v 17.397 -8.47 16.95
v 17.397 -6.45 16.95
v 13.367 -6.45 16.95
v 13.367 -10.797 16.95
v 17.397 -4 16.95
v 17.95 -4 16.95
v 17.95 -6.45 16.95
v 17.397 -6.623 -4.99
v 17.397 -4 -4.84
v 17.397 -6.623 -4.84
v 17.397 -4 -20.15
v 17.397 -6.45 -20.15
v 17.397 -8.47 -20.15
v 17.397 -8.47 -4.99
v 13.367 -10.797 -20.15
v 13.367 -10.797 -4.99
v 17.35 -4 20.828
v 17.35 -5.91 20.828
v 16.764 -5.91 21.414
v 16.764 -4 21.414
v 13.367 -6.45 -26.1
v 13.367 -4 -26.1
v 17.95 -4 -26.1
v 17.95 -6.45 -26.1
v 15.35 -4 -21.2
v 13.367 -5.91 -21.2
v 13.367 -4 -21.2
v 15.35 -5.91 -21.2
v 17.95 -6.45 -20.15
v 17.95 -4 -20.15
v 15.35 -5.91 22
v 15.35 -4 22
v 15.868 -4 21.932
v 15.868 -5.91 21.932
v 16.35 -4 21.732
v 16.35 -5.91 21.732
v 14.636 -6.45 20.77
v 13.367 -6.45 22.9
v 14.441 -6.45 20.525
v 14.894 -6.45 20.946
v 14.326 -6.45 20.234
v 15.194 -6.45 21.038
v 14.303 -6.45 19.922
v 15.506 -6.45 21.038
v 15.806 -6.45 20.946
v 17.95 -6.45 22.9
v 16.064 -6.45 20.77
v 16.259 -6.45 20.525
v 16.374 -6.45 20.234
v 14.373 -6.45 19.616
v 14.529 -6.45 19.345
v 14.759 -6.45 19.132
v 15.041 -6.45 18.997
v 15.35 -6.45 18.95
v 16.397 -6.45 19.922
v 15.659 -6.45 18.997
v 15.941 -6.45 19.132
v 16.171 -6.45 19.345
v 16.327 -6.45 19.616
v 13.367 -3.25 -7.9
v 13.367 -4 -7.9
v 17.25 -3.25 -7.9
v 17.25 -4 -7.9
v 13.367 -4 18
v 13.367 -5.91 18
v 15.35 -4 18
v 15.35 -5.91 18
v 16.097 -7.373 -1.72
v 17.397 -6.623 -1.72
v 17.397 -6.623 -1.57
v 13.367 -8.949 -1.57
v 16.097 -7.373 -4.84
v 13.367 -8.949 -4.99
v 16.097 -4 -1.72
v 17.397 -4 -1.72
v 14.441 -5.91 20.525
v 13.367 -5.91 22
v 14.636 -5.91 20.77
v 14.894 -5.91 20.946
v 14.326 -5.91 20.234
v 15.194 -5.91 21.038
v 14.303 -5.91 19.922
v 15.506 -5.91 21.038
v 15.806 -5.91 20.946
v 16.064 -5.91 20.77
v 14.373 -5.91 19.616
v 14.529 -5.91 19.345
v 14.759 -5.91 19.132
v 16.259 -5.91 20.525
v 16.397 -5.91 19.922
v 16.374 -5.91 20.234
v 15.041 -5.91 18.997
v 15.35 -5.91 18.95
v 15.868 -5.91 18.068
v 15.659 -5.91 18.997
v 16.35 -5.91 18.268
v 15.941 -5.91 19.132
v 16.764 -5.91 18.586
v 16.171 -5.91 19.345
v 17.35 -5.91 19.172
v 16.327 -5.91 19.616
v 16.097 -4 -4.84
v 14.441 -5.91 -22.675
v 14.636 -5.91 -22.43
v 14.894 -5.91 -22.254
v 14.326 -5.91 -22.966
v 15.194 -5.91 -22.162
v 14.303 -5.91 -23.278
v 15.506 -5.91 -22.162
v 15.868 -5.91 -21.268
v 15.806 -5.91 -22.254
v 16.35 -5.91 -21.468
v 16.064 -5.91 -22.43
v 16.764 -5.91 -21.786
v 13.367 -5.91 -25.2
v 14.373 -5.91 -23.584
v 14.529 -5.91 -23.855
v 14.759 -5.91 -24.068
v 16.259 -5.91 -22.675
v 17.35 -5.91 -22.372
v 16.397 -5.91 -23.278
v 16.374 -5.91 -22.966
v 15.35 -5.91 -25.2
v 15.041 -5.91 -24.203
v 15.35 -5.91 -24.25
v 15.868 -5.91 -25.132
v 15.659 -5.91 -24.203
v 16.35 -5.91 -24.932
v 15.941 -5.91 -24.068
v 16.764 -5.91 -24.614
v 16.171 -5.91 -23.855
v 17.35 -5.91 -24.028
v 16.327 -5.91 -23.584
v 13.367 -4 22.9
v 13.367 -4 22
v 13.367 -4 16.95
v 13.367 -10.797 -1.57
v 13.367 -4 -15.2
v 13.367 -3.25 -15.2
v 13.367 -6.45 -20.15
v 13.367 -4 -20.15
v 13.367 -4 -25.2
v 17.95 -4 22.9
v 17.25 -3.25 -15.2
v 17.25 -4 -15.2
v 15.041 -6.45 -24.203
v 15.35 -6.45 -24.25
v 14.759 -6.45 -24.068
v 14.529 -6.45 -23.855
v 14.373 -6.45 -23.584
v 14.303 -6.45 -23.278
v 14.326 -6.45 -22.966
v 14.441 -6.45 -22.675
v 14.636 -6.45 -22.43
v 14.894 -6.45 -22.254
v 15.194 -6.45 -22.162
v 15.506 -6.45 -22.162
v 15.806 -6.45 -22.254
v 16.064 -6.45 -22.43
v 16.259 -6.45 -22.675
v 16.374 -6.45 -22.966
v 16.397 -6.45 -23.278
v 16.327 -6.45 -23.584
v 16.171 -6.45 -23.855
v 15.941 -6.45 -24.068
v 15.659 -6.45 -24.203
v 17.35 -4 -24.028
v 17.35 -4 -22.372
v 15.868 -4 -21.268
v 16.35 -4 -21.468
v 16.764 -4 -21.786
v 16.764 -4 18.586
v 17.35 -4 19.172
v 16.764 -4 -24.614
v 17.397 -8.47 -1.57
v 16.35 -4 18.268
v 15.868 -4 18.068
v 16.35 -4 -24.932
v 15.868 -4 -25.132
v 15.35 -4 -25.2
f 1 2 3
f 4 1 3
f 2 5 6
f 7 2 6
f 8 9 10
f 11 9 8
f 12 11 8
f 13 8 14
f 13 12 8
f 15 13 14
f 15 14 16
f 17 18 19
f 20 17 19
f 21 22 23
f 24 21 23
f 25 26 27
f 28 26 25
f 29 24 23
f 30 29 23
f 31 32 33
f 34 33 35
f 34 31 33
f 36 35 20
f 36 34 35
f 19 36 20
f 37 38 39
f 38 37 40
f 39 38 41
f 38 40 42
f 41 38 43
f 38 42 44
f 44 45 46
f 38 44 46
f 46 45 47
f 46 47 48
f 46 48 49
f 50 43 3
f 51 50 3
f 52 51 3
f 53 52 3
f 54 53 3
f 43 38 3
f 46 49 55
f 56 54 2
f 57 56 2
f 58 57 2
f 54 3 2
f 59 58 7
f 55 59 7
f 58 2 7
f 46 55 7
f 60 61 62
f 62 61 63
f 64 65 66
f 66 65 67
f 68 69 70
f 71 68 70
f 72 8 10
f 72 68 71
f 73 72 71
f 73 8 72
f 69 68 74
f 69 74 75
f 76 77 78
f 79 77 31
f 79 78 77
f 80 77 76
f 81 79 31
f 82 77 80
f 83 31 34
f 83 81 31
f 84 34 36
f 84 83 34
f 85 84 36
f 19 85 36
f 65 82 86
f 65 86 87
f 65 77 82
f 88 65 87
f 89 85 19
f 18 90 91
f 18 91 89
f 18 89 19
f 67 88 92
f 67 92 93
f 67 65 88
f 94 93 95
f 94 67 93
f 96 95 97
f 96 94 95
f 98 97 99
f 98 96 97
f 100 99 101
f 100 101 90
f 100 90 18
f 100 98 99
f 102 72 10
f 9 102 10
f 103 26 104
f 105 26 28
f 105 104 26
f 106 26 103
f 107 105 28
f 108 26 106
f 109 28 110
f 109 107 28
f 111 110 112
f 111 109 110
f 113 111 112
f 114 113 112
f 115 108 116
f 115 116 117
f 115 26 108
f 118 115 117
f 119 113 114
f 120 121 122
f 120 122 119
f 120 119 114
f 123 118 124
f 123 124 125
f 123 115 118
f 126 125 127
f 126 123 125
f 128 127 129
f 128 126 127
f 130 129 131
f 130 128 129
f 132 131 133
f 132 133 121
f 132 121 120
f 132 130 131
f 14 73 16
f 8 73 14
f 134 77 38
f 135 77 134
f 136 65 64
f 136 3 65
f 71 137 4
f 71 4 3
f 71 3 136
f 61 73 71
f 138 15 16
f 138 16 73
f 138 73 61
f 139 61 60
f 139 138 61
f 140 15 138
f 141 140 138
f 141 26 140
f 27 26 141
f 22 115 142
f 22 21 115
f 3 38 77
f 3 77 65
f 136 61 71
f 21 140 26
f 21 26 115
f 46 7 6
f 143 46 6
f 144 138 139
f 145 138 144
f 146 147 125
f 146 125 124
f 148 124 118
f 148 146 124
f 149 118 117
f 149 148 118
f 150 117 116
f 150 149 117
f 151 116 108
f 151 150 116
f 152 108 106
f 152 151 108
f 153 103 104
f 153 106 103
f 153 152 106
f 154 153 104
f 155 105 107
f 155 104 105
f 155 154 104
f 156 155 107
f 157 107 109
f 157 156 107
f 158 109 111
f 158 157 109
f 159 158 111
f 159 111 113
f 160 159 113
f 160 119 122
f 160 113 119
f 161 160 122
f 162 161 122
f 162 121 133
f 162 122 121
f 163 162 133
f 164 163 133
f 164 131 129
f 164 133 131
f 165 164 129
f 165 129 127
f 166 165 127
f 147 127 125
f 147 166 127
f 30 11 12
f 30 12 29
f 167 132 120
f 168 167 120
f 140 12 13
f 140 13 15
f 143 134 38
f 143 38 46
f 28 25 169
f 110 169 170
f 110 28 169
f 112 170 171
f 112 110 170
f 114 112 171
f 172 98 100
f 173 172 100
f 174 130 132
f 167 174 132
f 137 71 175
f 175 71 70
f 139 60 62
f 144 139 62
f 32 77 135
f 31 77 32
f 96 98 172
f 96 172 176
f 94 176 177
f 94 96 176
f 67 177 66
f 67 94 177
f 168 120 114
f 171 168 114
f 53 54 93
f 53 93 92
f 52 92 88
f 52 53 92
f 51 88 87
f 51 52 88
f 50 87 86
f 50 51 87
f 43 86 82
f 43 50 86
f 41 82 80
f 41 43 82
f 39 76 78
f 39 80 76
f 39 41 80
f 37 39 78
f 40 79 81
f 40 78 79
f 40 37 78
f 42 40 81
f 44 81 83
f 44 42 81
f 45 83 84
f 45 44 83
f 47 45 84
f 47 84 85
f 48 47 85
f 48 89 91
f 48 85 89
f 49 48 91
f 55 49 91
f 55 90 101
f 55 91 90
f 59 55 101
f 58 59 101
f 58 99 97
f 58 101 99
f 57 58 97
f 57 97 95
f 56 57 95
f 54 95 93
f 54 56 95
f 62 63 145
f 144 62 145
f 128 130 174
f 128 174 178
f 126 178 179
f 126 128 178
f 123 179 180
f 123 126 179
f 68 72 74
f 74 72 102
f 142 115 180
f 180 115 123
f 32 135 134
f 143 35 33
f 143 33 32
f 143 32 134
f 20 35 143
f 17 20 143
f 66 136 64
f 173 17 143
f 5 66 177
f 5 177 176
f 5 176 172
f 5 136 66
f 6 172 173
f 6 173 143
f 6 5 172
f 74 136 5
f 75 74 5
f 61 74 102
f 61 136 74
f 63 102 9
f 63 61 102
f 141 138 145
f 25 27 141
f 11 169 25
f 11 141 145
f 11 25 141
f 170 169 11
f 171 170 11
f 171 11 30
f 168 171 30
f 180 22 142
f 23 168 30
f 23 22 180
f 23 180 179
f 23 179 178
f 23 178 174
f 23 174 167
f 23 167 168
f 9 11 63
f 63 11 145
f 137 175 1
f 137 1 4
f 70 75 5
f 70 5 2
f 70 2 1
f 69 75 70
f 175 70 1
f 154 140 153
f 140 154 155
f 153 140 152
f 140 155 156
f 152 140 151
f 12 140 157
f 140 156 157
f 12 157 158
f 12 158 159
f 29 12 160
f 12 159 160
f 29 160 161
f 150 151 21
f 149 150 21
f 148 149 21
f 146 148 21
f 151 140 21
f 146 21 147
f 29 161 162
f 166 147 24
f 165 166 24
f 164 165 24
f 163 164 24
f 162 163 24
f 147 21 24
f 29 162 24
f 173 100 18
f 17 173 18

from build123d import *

# Parameters (mm, degrees)
CLAMP_START                     = -20.15
CLAMP_X_BASE_DEPTH              = 37.1
WIRE_START                      = -4.99
WIRE_CHANNEL_X_BASE_Z_5_0_DEPTH = 3.42
WIRE_START_2                    = -4.84
SKETCH3_W                       = 1.6
SKETCH3_H                       = 4.320657937
WIRE_NOTCH_X_BASE_Z_5_0_DEPTH   = 3.12
EAR_START                       = -26.1
SKETCH4_W                       = 4.582851153
SKETCH4_H                       = 2.45
EAR_X_BASE_26_DEPTH             = 5.95
EAR_START_2                     = 16.95
SKETCH5_W                       = 4.582851153
SKETCH5_H                       = 2.45
EAR_X_BASE_17_DEPTH             = 5.95
CUT_EXTRUDE3_START              = -6.55
SKETCH6_R                       = 1.05
CUT_EXTRUDE3_DEPTH              = 2.65
CUT_EXTRUDE4_START              = -5.91
SKETCH7_R                       = 2
CUT_EXTRUDE4_DEPTH              = 1.92
CUT_EXTRUDE5_START              = -5.91
SKETCH8_W                       = 2.082851153
SKETCH8_H                       = 4
CUT_EXTRUDE5_DEPTH              = 1.92
CUT_EXTRUDE6_START              = -5.91
CUT_EXTRUDE6_DEPTH              = 1.92
CUT_EXTRUDE7_START              = -5.91
CUT_EXTRUDE7_DEPTH              = 1.92
BOSS_EXTRUDE4_START             = -4
SKETCH11_W                      = 3.882851153
SKETCH11_H                      = 7.3
BOSS_EXTRUDE4_DEPTH             = 0.75


with BuildPart() as part:
    # Sketch1 → Clamp +X base (new body)
    with BuildSketch(Plane.XY.offset(CLAMP_START)):
        Polygon((13.367148847, -4), (17.397275866, -4), (17.397275866, -8.470102587), (13.367148847, -10.796897507), align=None)
    extrude(amount=CLAMP_X_BASE_DEPTH)

    # Sketch2 → Wire channel +X base Z -5.0 (cut)
    with BuildSketch(Plane.XY.offset(WIRE_START)):
        Polygon((11.102085338, -12.220102587), (19.762339376, -7.220102587), (18.912339376, -5.747859401), (10.252085338, -10.747859401), align=None)
    extrude(amount=WIRE_CHANNEL_X_BASE_Z_5_0_DEPTH, mode=Mode.SUBTRACT)

    # Sketch3 → Wire notch +X base Z -5.0 (cut)
    with BuildSketch(Plane.XY.offset(WIRE_START_2)):
        with Locations((16.897275866, -6.060328969)):
            Rectangle(SKETCH3_W, SKETCH3_H)
    extrude(amount=WIRE_NOTCH_X_BASE_Z_5_0_DEPTH, mode=Mode.SUBTRACT)

    # Sketch4 → Ear +X base -26 (add)
    with BuildSketch(Plane.XY.offset(EAR_START)):
        with Locations((15.658574424, -5.225)):
            Rectangle(SKETCH4_W, SKETCH4_H)
    extrude(amount=EAR_X_BASE_26_DEPTH)

    # Sketch5 → Ear +X base 17 (add)
    with BuildSketch(Plane.XY.offset(EAR_START_2)):
        with Locations((15.658574424, -5.225)):
            Rectangle(SKETCH5_W, SKETCH5_H)
    extrude(amount=EAR_X_BASE_17_DEPTH)

    # Sketch6 → Cut-Extrude3 (cut)
    with BuildSketch(Plane(origin=(0, 0, 0), x_dir=(1, 0, 0), z_dir=(0, 1, 0)).offset(CUT_EXTRUDE3_START)):
        with Locations(Location((15.35, 23.2, 0), (0, 0, 90))):
            Circle(SKETCH6_R)
        with Locations(Location((15.35, -20, 0), (0, 0, 90))):
            Circle(SKETCH6_R)
    extrude(amount=CUT_EXTRUDE3_DEPTH, mode=Mode.SUBTRACT)

    # Sketch7 → Cut-Extrude4 (cut)
    with BuildSketch(Plane(origin=(0, 0, 0), x_dir=(1, 0, 0), z_dir=(0, 1, 0)).offset(CUT_EXTRUDE4_START)):
        with Locations((15.35, 23.2)):
            Circle(SKETCH7_R)
        with Locations((15.35, -20)):
            Circle(SKETCH7_R)
    extrude(amount=CUT_EXTRUDE4_DEPTH, mode=Mode.SUBTRACT)

    # Sketch8 → Cut-Extrude5 (cut)
    with BuildSketch(Plane(origin=(0, 0, 0), x_dir=(1, 0, 0), z_dir=(0, 1, 0)).offset(CUT_EXTRUDE5_START)):
        with Locations((14.308574424, 23.2)):
            Rectangle(SKETCH8_W, SKETCH8_H)
        with Locations((14.308574424, -20)):
            Rectangle(SKETCH8_W, SKETCH8_H)
    extrude(amount=CUT_EXTRUDE5_DEPTH, mode=Mode.SUBTRACT)

    # Sketch9 → Cut-Extrude6 (cut)
    with BuildSketch(Plane(origin=(0, 0, 0), x_dir=(1, 0, 0), z_dir=(0, 1, 0)).offset(CUT_EXTRUDE6_START)):
        Polygon((15.35, 25.2), (16.764213562, 24.614213562), (17.35, 24.028427125), (17.35, 22.371572875), (16.764213562, 21.785786438), (15.35, 21.2), align=None)
    extrude(amount=CUT_EXTRUDE6_DEPTH, mode=Mode.SUBTRACT)

    # Sketch10 → Cut-Extrude7 (cut)
    with BuildSketch(Plane(origin=(0, 0, 0), x_dir=(1, 0, 0), z_dir=(0, 1, 0)).offset(CUT_EXTRUDE7_START)):
        Polygon((15.35, -18), (16.764213562, -18.585786438), (17.35, -19.171572875), (17.35, -20.828427125), (16.764213562, -21.414213562), (15.35, -22), align=None)
    extrude(amount=CUT_EXTRUDE7_DEPTH, mode=Mode.SUBTRACT)

    # Sketch11 → Boss-Extrude4 (add)
    with BuildSketch(Plane(origin=(0, 0, 0), x_dir=(1, 0, 0), z_dir=(0, 1, 0)).offset(BOSS_EXTRUDE4_START)):
        with Locations((15.308574424, 11.55)):
            Rectangle(SKETCH11_W, SKETCH11_H)
    extrude(amount=BOSS_EXTRUDE4_DEPTH)


solid = part.part
